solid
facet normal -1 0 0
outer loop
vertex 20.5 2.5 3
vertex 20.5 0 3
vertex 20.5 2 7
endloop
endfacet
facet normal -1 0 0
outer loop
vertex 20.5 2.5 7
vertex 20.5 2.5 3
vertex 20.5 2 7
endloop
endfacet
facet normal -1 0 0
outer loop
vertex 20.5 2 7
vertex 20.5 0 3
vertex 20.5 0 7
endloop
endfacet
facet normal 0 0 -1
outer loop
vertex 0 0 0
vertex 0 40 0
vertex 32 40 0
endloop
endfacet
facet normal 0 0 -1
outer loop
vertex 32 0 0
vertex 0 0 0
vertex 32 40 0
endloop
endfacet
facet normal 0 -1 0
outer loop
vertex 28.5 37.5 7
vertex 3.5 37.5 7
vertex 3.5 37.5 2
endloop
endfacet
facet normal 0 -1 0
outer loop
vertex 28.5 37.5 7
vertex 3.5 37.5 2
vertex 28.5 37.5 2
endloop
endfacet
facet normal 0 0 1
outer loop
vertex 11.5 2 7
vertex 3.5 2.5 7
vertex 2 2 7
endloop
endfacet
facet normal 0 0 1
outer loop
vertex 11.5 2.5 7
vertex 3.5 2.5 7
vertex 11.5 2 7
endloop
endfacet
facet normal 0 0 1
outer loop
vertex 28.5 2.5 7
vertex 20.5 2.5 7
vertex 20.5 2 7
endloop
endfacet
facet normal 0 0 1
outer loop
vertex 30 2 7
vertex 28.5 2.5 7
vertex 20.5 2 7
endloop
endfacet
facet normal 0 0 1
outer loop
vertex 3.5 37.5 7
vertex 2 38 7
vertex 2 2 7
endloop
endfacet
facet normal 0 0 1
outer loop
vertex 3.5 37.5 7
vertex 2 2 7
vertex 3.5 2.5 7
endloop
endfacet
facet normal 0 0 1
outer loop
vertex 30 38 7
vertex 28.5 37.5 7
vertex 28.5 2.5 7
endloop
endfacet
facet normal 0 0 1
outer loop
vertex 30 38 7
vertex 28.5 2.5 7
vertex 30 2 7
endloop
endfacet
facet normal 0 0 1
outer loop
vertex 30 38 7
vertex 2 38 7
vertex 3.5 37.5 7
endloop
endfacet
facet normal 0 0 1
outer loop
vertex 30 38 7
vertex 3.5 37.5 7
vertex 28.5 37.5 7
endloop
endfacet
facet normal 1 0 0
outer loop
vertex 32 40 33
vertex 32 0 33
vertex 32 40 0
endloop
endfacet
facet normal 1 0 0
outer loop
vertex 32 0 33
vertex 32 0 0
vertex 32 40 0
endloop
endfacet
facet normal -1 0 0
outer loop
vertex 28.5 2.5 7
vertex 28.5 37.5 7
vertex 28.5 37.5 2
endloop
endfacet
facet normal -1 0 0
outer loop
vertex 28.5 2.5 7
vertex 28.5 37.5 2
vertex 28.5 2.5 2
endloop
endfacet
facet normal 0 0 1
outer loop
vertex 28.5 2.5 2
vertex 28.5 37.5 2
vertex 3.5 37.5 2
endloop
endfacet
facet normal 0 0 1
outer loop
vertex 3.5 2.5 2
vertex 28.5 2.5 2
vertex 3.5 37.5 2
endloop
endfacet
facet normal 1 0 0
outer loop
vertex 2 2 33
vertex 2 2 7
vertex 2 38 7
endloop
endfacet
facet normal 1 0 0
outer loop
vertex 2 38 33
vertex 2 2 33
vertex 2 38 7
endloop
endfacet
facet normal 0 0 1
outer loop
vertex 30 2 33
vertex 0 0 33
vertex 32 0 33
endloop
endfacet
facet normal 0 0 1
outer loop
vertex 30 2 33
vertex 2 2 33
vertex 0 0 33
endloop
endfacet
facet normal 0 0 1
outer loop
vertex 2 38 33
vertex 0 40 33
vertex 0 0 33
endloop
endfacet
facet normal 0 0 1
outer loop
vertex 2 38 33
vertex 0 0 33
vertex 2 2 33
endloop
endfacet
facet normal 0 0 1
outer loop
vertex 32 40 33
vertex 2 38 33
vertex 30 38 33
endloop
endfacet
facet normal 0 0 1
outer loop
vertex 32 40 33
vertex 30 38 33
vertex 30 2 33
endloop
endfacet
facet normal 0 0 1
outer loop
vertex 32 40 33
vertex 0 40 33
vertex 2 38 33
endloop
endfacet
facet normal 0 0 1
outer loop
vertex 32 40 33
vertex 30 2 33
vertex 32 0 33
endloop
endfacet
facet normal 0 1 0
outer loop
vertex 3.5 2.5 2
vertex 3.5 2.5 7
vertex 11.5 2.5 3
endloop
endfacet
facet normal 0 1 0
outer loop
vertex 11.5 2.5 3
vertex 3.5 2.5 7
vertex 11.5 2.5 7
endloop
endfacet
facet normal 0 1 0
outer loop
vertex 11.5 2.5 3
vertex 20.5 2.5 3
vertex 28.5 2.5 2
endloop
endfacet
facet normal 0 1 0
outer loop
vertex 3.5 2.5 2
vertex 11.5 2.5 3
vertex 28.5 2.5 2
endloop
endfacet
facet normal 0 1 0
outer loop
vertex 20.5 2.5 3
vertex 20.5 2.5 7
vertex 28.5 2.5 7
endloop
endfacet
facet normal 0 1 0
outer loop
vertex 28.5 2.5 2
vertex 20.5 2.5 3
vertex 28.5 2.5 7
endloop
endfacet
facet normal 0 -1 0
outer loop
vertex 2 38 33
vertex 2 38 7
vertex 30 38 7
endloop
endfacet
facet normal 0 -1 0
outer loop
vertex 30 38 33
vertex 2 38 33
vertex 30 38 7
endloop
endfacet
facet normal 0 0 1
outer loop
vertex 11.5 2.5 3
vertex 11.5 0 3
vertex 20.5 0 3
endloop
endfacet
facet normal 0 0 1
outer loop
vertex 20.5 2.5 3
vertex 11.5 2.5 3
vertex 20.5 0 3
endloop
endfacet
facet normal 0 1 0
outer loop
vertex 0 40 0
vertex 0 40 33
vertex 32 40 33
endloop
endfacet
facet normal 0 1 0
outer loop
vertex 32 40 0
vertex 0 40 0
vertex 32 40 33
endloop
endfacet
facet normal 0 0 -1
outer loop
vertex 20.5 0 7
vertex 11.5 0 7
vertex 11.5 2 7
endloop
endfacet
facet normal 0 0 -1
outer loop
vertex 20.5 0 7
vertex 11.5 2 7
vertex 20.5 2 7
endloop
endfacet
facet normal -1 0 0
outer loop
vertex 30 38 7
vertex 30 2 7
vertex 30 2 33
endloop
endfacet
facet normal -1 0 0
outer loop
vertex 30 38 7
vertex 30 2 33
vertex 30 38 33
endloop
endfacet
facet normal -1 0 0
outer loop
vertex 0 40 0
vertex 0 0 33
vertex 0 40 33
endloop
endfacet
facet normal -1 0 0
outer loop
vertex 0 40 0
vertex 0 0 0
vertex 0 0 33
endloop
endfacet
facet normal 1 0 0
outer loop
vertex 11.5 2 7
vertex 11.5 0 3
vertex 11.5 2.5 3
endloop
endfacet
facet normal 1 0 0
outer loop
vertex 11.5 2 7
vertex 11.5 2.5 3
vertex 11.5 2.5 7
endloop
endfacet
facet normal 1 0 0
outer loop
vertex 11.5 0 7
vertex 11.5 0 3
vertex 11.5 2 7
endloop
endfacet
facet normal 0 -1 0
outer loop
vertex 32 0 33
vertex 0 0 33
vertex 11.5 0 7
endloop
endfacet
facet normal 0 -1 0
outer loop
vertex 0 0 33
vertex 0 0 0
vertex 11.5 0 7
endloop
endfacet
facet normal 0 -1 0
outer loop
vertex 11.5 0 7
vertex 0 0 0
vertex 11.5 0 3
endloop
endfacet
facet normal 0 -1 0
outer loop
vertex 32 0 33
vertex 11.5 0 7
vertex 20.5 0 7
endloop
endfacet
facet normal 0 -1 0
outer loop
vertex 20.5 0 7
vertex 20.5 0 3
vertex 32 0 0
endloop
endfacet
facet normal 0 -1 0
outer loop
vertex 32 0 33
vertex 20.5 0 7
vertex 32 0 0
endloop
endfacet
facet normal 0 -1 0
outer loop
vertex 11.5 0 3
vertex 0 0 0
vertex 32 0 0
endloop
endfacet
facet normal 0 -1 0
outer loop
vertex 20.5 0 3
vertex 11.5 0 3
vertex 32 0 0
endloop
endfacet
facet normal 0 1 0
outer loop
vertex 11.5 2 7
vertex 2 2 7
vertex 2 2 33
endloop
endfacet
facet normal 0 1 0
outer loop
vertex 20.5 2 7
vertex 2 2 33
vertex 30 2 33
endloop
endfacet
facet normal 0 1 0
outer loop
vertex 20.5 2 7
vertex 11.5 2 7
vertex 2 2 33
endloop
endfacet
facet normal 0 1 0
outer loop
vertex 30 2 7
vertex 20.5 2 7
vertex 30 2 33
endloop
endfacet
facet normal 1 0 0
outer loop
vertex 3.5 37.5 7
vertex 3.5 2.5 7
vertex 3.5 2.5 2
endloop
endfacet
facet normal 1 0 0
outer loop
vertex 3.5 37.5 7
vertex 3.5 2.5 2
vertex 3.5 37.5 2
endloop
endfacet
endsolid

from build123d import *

# Parameters (mm, degrees)
SKETCH_W        = 32
SKETCH_H        = 40
PAD_DEPTH       = 7
SKETCH001_W     = 32
SKETCH001_H     = 40
SKETCH001_W_2   = 28
SKETCH001_H_2   = 36
PAD001_DEPTH    = 26
POCKET_DEPTH    = 5
SKETCH003_W     = 9
SKETCH003_H     = 4
POCKET001_DEPTH = 5


with BuildPart() as part:
    # Sketch → Pad (new body)
    with BuildSketch(Plane.XY):
        with Locations((16, 20)):
            Rectangle(SKETCH_W, SKETCH_H)
    extrude(amount=PAD_DEPTH)

    # Sketch001 → Pad001 (new body)
    with BuildSketch(Plane.XY.offset(7)):
        with Locations((16, 20)):
            Rectangle(SKETCH001_W, SKETCH001_H)
        with Locations((16, 20)):
            Rectangle(SKETCH001_W_2, SKETCH001_H_2, mode=Mode.SUBTRACT)
    extrude(amount=PAD001_DEPTH)

    # Sketch002 → Pocket (cut)
    with BuildSketch(Plane.XY.offset(7)):
        Polygon((3.5, 37.5), (28.5, 37.5), (28.5, 2.5), (16, 2.5), (3.5, 2.5), align=None)
    extrude(amount=-POCKET_DEPTH, mode=Mode.SUBTRACT)

    # Sketch003 → Pocket001 (cut)
    with BuildSketch(Plane.XZ):
        with Locations((16, 5)):
            Rectangle(SKETCH003_W, SKETCH003_H)
    extrude(amount=-POCKET001_DEPTH, mode=Mode.SUBTRACT)


solid = part.part
